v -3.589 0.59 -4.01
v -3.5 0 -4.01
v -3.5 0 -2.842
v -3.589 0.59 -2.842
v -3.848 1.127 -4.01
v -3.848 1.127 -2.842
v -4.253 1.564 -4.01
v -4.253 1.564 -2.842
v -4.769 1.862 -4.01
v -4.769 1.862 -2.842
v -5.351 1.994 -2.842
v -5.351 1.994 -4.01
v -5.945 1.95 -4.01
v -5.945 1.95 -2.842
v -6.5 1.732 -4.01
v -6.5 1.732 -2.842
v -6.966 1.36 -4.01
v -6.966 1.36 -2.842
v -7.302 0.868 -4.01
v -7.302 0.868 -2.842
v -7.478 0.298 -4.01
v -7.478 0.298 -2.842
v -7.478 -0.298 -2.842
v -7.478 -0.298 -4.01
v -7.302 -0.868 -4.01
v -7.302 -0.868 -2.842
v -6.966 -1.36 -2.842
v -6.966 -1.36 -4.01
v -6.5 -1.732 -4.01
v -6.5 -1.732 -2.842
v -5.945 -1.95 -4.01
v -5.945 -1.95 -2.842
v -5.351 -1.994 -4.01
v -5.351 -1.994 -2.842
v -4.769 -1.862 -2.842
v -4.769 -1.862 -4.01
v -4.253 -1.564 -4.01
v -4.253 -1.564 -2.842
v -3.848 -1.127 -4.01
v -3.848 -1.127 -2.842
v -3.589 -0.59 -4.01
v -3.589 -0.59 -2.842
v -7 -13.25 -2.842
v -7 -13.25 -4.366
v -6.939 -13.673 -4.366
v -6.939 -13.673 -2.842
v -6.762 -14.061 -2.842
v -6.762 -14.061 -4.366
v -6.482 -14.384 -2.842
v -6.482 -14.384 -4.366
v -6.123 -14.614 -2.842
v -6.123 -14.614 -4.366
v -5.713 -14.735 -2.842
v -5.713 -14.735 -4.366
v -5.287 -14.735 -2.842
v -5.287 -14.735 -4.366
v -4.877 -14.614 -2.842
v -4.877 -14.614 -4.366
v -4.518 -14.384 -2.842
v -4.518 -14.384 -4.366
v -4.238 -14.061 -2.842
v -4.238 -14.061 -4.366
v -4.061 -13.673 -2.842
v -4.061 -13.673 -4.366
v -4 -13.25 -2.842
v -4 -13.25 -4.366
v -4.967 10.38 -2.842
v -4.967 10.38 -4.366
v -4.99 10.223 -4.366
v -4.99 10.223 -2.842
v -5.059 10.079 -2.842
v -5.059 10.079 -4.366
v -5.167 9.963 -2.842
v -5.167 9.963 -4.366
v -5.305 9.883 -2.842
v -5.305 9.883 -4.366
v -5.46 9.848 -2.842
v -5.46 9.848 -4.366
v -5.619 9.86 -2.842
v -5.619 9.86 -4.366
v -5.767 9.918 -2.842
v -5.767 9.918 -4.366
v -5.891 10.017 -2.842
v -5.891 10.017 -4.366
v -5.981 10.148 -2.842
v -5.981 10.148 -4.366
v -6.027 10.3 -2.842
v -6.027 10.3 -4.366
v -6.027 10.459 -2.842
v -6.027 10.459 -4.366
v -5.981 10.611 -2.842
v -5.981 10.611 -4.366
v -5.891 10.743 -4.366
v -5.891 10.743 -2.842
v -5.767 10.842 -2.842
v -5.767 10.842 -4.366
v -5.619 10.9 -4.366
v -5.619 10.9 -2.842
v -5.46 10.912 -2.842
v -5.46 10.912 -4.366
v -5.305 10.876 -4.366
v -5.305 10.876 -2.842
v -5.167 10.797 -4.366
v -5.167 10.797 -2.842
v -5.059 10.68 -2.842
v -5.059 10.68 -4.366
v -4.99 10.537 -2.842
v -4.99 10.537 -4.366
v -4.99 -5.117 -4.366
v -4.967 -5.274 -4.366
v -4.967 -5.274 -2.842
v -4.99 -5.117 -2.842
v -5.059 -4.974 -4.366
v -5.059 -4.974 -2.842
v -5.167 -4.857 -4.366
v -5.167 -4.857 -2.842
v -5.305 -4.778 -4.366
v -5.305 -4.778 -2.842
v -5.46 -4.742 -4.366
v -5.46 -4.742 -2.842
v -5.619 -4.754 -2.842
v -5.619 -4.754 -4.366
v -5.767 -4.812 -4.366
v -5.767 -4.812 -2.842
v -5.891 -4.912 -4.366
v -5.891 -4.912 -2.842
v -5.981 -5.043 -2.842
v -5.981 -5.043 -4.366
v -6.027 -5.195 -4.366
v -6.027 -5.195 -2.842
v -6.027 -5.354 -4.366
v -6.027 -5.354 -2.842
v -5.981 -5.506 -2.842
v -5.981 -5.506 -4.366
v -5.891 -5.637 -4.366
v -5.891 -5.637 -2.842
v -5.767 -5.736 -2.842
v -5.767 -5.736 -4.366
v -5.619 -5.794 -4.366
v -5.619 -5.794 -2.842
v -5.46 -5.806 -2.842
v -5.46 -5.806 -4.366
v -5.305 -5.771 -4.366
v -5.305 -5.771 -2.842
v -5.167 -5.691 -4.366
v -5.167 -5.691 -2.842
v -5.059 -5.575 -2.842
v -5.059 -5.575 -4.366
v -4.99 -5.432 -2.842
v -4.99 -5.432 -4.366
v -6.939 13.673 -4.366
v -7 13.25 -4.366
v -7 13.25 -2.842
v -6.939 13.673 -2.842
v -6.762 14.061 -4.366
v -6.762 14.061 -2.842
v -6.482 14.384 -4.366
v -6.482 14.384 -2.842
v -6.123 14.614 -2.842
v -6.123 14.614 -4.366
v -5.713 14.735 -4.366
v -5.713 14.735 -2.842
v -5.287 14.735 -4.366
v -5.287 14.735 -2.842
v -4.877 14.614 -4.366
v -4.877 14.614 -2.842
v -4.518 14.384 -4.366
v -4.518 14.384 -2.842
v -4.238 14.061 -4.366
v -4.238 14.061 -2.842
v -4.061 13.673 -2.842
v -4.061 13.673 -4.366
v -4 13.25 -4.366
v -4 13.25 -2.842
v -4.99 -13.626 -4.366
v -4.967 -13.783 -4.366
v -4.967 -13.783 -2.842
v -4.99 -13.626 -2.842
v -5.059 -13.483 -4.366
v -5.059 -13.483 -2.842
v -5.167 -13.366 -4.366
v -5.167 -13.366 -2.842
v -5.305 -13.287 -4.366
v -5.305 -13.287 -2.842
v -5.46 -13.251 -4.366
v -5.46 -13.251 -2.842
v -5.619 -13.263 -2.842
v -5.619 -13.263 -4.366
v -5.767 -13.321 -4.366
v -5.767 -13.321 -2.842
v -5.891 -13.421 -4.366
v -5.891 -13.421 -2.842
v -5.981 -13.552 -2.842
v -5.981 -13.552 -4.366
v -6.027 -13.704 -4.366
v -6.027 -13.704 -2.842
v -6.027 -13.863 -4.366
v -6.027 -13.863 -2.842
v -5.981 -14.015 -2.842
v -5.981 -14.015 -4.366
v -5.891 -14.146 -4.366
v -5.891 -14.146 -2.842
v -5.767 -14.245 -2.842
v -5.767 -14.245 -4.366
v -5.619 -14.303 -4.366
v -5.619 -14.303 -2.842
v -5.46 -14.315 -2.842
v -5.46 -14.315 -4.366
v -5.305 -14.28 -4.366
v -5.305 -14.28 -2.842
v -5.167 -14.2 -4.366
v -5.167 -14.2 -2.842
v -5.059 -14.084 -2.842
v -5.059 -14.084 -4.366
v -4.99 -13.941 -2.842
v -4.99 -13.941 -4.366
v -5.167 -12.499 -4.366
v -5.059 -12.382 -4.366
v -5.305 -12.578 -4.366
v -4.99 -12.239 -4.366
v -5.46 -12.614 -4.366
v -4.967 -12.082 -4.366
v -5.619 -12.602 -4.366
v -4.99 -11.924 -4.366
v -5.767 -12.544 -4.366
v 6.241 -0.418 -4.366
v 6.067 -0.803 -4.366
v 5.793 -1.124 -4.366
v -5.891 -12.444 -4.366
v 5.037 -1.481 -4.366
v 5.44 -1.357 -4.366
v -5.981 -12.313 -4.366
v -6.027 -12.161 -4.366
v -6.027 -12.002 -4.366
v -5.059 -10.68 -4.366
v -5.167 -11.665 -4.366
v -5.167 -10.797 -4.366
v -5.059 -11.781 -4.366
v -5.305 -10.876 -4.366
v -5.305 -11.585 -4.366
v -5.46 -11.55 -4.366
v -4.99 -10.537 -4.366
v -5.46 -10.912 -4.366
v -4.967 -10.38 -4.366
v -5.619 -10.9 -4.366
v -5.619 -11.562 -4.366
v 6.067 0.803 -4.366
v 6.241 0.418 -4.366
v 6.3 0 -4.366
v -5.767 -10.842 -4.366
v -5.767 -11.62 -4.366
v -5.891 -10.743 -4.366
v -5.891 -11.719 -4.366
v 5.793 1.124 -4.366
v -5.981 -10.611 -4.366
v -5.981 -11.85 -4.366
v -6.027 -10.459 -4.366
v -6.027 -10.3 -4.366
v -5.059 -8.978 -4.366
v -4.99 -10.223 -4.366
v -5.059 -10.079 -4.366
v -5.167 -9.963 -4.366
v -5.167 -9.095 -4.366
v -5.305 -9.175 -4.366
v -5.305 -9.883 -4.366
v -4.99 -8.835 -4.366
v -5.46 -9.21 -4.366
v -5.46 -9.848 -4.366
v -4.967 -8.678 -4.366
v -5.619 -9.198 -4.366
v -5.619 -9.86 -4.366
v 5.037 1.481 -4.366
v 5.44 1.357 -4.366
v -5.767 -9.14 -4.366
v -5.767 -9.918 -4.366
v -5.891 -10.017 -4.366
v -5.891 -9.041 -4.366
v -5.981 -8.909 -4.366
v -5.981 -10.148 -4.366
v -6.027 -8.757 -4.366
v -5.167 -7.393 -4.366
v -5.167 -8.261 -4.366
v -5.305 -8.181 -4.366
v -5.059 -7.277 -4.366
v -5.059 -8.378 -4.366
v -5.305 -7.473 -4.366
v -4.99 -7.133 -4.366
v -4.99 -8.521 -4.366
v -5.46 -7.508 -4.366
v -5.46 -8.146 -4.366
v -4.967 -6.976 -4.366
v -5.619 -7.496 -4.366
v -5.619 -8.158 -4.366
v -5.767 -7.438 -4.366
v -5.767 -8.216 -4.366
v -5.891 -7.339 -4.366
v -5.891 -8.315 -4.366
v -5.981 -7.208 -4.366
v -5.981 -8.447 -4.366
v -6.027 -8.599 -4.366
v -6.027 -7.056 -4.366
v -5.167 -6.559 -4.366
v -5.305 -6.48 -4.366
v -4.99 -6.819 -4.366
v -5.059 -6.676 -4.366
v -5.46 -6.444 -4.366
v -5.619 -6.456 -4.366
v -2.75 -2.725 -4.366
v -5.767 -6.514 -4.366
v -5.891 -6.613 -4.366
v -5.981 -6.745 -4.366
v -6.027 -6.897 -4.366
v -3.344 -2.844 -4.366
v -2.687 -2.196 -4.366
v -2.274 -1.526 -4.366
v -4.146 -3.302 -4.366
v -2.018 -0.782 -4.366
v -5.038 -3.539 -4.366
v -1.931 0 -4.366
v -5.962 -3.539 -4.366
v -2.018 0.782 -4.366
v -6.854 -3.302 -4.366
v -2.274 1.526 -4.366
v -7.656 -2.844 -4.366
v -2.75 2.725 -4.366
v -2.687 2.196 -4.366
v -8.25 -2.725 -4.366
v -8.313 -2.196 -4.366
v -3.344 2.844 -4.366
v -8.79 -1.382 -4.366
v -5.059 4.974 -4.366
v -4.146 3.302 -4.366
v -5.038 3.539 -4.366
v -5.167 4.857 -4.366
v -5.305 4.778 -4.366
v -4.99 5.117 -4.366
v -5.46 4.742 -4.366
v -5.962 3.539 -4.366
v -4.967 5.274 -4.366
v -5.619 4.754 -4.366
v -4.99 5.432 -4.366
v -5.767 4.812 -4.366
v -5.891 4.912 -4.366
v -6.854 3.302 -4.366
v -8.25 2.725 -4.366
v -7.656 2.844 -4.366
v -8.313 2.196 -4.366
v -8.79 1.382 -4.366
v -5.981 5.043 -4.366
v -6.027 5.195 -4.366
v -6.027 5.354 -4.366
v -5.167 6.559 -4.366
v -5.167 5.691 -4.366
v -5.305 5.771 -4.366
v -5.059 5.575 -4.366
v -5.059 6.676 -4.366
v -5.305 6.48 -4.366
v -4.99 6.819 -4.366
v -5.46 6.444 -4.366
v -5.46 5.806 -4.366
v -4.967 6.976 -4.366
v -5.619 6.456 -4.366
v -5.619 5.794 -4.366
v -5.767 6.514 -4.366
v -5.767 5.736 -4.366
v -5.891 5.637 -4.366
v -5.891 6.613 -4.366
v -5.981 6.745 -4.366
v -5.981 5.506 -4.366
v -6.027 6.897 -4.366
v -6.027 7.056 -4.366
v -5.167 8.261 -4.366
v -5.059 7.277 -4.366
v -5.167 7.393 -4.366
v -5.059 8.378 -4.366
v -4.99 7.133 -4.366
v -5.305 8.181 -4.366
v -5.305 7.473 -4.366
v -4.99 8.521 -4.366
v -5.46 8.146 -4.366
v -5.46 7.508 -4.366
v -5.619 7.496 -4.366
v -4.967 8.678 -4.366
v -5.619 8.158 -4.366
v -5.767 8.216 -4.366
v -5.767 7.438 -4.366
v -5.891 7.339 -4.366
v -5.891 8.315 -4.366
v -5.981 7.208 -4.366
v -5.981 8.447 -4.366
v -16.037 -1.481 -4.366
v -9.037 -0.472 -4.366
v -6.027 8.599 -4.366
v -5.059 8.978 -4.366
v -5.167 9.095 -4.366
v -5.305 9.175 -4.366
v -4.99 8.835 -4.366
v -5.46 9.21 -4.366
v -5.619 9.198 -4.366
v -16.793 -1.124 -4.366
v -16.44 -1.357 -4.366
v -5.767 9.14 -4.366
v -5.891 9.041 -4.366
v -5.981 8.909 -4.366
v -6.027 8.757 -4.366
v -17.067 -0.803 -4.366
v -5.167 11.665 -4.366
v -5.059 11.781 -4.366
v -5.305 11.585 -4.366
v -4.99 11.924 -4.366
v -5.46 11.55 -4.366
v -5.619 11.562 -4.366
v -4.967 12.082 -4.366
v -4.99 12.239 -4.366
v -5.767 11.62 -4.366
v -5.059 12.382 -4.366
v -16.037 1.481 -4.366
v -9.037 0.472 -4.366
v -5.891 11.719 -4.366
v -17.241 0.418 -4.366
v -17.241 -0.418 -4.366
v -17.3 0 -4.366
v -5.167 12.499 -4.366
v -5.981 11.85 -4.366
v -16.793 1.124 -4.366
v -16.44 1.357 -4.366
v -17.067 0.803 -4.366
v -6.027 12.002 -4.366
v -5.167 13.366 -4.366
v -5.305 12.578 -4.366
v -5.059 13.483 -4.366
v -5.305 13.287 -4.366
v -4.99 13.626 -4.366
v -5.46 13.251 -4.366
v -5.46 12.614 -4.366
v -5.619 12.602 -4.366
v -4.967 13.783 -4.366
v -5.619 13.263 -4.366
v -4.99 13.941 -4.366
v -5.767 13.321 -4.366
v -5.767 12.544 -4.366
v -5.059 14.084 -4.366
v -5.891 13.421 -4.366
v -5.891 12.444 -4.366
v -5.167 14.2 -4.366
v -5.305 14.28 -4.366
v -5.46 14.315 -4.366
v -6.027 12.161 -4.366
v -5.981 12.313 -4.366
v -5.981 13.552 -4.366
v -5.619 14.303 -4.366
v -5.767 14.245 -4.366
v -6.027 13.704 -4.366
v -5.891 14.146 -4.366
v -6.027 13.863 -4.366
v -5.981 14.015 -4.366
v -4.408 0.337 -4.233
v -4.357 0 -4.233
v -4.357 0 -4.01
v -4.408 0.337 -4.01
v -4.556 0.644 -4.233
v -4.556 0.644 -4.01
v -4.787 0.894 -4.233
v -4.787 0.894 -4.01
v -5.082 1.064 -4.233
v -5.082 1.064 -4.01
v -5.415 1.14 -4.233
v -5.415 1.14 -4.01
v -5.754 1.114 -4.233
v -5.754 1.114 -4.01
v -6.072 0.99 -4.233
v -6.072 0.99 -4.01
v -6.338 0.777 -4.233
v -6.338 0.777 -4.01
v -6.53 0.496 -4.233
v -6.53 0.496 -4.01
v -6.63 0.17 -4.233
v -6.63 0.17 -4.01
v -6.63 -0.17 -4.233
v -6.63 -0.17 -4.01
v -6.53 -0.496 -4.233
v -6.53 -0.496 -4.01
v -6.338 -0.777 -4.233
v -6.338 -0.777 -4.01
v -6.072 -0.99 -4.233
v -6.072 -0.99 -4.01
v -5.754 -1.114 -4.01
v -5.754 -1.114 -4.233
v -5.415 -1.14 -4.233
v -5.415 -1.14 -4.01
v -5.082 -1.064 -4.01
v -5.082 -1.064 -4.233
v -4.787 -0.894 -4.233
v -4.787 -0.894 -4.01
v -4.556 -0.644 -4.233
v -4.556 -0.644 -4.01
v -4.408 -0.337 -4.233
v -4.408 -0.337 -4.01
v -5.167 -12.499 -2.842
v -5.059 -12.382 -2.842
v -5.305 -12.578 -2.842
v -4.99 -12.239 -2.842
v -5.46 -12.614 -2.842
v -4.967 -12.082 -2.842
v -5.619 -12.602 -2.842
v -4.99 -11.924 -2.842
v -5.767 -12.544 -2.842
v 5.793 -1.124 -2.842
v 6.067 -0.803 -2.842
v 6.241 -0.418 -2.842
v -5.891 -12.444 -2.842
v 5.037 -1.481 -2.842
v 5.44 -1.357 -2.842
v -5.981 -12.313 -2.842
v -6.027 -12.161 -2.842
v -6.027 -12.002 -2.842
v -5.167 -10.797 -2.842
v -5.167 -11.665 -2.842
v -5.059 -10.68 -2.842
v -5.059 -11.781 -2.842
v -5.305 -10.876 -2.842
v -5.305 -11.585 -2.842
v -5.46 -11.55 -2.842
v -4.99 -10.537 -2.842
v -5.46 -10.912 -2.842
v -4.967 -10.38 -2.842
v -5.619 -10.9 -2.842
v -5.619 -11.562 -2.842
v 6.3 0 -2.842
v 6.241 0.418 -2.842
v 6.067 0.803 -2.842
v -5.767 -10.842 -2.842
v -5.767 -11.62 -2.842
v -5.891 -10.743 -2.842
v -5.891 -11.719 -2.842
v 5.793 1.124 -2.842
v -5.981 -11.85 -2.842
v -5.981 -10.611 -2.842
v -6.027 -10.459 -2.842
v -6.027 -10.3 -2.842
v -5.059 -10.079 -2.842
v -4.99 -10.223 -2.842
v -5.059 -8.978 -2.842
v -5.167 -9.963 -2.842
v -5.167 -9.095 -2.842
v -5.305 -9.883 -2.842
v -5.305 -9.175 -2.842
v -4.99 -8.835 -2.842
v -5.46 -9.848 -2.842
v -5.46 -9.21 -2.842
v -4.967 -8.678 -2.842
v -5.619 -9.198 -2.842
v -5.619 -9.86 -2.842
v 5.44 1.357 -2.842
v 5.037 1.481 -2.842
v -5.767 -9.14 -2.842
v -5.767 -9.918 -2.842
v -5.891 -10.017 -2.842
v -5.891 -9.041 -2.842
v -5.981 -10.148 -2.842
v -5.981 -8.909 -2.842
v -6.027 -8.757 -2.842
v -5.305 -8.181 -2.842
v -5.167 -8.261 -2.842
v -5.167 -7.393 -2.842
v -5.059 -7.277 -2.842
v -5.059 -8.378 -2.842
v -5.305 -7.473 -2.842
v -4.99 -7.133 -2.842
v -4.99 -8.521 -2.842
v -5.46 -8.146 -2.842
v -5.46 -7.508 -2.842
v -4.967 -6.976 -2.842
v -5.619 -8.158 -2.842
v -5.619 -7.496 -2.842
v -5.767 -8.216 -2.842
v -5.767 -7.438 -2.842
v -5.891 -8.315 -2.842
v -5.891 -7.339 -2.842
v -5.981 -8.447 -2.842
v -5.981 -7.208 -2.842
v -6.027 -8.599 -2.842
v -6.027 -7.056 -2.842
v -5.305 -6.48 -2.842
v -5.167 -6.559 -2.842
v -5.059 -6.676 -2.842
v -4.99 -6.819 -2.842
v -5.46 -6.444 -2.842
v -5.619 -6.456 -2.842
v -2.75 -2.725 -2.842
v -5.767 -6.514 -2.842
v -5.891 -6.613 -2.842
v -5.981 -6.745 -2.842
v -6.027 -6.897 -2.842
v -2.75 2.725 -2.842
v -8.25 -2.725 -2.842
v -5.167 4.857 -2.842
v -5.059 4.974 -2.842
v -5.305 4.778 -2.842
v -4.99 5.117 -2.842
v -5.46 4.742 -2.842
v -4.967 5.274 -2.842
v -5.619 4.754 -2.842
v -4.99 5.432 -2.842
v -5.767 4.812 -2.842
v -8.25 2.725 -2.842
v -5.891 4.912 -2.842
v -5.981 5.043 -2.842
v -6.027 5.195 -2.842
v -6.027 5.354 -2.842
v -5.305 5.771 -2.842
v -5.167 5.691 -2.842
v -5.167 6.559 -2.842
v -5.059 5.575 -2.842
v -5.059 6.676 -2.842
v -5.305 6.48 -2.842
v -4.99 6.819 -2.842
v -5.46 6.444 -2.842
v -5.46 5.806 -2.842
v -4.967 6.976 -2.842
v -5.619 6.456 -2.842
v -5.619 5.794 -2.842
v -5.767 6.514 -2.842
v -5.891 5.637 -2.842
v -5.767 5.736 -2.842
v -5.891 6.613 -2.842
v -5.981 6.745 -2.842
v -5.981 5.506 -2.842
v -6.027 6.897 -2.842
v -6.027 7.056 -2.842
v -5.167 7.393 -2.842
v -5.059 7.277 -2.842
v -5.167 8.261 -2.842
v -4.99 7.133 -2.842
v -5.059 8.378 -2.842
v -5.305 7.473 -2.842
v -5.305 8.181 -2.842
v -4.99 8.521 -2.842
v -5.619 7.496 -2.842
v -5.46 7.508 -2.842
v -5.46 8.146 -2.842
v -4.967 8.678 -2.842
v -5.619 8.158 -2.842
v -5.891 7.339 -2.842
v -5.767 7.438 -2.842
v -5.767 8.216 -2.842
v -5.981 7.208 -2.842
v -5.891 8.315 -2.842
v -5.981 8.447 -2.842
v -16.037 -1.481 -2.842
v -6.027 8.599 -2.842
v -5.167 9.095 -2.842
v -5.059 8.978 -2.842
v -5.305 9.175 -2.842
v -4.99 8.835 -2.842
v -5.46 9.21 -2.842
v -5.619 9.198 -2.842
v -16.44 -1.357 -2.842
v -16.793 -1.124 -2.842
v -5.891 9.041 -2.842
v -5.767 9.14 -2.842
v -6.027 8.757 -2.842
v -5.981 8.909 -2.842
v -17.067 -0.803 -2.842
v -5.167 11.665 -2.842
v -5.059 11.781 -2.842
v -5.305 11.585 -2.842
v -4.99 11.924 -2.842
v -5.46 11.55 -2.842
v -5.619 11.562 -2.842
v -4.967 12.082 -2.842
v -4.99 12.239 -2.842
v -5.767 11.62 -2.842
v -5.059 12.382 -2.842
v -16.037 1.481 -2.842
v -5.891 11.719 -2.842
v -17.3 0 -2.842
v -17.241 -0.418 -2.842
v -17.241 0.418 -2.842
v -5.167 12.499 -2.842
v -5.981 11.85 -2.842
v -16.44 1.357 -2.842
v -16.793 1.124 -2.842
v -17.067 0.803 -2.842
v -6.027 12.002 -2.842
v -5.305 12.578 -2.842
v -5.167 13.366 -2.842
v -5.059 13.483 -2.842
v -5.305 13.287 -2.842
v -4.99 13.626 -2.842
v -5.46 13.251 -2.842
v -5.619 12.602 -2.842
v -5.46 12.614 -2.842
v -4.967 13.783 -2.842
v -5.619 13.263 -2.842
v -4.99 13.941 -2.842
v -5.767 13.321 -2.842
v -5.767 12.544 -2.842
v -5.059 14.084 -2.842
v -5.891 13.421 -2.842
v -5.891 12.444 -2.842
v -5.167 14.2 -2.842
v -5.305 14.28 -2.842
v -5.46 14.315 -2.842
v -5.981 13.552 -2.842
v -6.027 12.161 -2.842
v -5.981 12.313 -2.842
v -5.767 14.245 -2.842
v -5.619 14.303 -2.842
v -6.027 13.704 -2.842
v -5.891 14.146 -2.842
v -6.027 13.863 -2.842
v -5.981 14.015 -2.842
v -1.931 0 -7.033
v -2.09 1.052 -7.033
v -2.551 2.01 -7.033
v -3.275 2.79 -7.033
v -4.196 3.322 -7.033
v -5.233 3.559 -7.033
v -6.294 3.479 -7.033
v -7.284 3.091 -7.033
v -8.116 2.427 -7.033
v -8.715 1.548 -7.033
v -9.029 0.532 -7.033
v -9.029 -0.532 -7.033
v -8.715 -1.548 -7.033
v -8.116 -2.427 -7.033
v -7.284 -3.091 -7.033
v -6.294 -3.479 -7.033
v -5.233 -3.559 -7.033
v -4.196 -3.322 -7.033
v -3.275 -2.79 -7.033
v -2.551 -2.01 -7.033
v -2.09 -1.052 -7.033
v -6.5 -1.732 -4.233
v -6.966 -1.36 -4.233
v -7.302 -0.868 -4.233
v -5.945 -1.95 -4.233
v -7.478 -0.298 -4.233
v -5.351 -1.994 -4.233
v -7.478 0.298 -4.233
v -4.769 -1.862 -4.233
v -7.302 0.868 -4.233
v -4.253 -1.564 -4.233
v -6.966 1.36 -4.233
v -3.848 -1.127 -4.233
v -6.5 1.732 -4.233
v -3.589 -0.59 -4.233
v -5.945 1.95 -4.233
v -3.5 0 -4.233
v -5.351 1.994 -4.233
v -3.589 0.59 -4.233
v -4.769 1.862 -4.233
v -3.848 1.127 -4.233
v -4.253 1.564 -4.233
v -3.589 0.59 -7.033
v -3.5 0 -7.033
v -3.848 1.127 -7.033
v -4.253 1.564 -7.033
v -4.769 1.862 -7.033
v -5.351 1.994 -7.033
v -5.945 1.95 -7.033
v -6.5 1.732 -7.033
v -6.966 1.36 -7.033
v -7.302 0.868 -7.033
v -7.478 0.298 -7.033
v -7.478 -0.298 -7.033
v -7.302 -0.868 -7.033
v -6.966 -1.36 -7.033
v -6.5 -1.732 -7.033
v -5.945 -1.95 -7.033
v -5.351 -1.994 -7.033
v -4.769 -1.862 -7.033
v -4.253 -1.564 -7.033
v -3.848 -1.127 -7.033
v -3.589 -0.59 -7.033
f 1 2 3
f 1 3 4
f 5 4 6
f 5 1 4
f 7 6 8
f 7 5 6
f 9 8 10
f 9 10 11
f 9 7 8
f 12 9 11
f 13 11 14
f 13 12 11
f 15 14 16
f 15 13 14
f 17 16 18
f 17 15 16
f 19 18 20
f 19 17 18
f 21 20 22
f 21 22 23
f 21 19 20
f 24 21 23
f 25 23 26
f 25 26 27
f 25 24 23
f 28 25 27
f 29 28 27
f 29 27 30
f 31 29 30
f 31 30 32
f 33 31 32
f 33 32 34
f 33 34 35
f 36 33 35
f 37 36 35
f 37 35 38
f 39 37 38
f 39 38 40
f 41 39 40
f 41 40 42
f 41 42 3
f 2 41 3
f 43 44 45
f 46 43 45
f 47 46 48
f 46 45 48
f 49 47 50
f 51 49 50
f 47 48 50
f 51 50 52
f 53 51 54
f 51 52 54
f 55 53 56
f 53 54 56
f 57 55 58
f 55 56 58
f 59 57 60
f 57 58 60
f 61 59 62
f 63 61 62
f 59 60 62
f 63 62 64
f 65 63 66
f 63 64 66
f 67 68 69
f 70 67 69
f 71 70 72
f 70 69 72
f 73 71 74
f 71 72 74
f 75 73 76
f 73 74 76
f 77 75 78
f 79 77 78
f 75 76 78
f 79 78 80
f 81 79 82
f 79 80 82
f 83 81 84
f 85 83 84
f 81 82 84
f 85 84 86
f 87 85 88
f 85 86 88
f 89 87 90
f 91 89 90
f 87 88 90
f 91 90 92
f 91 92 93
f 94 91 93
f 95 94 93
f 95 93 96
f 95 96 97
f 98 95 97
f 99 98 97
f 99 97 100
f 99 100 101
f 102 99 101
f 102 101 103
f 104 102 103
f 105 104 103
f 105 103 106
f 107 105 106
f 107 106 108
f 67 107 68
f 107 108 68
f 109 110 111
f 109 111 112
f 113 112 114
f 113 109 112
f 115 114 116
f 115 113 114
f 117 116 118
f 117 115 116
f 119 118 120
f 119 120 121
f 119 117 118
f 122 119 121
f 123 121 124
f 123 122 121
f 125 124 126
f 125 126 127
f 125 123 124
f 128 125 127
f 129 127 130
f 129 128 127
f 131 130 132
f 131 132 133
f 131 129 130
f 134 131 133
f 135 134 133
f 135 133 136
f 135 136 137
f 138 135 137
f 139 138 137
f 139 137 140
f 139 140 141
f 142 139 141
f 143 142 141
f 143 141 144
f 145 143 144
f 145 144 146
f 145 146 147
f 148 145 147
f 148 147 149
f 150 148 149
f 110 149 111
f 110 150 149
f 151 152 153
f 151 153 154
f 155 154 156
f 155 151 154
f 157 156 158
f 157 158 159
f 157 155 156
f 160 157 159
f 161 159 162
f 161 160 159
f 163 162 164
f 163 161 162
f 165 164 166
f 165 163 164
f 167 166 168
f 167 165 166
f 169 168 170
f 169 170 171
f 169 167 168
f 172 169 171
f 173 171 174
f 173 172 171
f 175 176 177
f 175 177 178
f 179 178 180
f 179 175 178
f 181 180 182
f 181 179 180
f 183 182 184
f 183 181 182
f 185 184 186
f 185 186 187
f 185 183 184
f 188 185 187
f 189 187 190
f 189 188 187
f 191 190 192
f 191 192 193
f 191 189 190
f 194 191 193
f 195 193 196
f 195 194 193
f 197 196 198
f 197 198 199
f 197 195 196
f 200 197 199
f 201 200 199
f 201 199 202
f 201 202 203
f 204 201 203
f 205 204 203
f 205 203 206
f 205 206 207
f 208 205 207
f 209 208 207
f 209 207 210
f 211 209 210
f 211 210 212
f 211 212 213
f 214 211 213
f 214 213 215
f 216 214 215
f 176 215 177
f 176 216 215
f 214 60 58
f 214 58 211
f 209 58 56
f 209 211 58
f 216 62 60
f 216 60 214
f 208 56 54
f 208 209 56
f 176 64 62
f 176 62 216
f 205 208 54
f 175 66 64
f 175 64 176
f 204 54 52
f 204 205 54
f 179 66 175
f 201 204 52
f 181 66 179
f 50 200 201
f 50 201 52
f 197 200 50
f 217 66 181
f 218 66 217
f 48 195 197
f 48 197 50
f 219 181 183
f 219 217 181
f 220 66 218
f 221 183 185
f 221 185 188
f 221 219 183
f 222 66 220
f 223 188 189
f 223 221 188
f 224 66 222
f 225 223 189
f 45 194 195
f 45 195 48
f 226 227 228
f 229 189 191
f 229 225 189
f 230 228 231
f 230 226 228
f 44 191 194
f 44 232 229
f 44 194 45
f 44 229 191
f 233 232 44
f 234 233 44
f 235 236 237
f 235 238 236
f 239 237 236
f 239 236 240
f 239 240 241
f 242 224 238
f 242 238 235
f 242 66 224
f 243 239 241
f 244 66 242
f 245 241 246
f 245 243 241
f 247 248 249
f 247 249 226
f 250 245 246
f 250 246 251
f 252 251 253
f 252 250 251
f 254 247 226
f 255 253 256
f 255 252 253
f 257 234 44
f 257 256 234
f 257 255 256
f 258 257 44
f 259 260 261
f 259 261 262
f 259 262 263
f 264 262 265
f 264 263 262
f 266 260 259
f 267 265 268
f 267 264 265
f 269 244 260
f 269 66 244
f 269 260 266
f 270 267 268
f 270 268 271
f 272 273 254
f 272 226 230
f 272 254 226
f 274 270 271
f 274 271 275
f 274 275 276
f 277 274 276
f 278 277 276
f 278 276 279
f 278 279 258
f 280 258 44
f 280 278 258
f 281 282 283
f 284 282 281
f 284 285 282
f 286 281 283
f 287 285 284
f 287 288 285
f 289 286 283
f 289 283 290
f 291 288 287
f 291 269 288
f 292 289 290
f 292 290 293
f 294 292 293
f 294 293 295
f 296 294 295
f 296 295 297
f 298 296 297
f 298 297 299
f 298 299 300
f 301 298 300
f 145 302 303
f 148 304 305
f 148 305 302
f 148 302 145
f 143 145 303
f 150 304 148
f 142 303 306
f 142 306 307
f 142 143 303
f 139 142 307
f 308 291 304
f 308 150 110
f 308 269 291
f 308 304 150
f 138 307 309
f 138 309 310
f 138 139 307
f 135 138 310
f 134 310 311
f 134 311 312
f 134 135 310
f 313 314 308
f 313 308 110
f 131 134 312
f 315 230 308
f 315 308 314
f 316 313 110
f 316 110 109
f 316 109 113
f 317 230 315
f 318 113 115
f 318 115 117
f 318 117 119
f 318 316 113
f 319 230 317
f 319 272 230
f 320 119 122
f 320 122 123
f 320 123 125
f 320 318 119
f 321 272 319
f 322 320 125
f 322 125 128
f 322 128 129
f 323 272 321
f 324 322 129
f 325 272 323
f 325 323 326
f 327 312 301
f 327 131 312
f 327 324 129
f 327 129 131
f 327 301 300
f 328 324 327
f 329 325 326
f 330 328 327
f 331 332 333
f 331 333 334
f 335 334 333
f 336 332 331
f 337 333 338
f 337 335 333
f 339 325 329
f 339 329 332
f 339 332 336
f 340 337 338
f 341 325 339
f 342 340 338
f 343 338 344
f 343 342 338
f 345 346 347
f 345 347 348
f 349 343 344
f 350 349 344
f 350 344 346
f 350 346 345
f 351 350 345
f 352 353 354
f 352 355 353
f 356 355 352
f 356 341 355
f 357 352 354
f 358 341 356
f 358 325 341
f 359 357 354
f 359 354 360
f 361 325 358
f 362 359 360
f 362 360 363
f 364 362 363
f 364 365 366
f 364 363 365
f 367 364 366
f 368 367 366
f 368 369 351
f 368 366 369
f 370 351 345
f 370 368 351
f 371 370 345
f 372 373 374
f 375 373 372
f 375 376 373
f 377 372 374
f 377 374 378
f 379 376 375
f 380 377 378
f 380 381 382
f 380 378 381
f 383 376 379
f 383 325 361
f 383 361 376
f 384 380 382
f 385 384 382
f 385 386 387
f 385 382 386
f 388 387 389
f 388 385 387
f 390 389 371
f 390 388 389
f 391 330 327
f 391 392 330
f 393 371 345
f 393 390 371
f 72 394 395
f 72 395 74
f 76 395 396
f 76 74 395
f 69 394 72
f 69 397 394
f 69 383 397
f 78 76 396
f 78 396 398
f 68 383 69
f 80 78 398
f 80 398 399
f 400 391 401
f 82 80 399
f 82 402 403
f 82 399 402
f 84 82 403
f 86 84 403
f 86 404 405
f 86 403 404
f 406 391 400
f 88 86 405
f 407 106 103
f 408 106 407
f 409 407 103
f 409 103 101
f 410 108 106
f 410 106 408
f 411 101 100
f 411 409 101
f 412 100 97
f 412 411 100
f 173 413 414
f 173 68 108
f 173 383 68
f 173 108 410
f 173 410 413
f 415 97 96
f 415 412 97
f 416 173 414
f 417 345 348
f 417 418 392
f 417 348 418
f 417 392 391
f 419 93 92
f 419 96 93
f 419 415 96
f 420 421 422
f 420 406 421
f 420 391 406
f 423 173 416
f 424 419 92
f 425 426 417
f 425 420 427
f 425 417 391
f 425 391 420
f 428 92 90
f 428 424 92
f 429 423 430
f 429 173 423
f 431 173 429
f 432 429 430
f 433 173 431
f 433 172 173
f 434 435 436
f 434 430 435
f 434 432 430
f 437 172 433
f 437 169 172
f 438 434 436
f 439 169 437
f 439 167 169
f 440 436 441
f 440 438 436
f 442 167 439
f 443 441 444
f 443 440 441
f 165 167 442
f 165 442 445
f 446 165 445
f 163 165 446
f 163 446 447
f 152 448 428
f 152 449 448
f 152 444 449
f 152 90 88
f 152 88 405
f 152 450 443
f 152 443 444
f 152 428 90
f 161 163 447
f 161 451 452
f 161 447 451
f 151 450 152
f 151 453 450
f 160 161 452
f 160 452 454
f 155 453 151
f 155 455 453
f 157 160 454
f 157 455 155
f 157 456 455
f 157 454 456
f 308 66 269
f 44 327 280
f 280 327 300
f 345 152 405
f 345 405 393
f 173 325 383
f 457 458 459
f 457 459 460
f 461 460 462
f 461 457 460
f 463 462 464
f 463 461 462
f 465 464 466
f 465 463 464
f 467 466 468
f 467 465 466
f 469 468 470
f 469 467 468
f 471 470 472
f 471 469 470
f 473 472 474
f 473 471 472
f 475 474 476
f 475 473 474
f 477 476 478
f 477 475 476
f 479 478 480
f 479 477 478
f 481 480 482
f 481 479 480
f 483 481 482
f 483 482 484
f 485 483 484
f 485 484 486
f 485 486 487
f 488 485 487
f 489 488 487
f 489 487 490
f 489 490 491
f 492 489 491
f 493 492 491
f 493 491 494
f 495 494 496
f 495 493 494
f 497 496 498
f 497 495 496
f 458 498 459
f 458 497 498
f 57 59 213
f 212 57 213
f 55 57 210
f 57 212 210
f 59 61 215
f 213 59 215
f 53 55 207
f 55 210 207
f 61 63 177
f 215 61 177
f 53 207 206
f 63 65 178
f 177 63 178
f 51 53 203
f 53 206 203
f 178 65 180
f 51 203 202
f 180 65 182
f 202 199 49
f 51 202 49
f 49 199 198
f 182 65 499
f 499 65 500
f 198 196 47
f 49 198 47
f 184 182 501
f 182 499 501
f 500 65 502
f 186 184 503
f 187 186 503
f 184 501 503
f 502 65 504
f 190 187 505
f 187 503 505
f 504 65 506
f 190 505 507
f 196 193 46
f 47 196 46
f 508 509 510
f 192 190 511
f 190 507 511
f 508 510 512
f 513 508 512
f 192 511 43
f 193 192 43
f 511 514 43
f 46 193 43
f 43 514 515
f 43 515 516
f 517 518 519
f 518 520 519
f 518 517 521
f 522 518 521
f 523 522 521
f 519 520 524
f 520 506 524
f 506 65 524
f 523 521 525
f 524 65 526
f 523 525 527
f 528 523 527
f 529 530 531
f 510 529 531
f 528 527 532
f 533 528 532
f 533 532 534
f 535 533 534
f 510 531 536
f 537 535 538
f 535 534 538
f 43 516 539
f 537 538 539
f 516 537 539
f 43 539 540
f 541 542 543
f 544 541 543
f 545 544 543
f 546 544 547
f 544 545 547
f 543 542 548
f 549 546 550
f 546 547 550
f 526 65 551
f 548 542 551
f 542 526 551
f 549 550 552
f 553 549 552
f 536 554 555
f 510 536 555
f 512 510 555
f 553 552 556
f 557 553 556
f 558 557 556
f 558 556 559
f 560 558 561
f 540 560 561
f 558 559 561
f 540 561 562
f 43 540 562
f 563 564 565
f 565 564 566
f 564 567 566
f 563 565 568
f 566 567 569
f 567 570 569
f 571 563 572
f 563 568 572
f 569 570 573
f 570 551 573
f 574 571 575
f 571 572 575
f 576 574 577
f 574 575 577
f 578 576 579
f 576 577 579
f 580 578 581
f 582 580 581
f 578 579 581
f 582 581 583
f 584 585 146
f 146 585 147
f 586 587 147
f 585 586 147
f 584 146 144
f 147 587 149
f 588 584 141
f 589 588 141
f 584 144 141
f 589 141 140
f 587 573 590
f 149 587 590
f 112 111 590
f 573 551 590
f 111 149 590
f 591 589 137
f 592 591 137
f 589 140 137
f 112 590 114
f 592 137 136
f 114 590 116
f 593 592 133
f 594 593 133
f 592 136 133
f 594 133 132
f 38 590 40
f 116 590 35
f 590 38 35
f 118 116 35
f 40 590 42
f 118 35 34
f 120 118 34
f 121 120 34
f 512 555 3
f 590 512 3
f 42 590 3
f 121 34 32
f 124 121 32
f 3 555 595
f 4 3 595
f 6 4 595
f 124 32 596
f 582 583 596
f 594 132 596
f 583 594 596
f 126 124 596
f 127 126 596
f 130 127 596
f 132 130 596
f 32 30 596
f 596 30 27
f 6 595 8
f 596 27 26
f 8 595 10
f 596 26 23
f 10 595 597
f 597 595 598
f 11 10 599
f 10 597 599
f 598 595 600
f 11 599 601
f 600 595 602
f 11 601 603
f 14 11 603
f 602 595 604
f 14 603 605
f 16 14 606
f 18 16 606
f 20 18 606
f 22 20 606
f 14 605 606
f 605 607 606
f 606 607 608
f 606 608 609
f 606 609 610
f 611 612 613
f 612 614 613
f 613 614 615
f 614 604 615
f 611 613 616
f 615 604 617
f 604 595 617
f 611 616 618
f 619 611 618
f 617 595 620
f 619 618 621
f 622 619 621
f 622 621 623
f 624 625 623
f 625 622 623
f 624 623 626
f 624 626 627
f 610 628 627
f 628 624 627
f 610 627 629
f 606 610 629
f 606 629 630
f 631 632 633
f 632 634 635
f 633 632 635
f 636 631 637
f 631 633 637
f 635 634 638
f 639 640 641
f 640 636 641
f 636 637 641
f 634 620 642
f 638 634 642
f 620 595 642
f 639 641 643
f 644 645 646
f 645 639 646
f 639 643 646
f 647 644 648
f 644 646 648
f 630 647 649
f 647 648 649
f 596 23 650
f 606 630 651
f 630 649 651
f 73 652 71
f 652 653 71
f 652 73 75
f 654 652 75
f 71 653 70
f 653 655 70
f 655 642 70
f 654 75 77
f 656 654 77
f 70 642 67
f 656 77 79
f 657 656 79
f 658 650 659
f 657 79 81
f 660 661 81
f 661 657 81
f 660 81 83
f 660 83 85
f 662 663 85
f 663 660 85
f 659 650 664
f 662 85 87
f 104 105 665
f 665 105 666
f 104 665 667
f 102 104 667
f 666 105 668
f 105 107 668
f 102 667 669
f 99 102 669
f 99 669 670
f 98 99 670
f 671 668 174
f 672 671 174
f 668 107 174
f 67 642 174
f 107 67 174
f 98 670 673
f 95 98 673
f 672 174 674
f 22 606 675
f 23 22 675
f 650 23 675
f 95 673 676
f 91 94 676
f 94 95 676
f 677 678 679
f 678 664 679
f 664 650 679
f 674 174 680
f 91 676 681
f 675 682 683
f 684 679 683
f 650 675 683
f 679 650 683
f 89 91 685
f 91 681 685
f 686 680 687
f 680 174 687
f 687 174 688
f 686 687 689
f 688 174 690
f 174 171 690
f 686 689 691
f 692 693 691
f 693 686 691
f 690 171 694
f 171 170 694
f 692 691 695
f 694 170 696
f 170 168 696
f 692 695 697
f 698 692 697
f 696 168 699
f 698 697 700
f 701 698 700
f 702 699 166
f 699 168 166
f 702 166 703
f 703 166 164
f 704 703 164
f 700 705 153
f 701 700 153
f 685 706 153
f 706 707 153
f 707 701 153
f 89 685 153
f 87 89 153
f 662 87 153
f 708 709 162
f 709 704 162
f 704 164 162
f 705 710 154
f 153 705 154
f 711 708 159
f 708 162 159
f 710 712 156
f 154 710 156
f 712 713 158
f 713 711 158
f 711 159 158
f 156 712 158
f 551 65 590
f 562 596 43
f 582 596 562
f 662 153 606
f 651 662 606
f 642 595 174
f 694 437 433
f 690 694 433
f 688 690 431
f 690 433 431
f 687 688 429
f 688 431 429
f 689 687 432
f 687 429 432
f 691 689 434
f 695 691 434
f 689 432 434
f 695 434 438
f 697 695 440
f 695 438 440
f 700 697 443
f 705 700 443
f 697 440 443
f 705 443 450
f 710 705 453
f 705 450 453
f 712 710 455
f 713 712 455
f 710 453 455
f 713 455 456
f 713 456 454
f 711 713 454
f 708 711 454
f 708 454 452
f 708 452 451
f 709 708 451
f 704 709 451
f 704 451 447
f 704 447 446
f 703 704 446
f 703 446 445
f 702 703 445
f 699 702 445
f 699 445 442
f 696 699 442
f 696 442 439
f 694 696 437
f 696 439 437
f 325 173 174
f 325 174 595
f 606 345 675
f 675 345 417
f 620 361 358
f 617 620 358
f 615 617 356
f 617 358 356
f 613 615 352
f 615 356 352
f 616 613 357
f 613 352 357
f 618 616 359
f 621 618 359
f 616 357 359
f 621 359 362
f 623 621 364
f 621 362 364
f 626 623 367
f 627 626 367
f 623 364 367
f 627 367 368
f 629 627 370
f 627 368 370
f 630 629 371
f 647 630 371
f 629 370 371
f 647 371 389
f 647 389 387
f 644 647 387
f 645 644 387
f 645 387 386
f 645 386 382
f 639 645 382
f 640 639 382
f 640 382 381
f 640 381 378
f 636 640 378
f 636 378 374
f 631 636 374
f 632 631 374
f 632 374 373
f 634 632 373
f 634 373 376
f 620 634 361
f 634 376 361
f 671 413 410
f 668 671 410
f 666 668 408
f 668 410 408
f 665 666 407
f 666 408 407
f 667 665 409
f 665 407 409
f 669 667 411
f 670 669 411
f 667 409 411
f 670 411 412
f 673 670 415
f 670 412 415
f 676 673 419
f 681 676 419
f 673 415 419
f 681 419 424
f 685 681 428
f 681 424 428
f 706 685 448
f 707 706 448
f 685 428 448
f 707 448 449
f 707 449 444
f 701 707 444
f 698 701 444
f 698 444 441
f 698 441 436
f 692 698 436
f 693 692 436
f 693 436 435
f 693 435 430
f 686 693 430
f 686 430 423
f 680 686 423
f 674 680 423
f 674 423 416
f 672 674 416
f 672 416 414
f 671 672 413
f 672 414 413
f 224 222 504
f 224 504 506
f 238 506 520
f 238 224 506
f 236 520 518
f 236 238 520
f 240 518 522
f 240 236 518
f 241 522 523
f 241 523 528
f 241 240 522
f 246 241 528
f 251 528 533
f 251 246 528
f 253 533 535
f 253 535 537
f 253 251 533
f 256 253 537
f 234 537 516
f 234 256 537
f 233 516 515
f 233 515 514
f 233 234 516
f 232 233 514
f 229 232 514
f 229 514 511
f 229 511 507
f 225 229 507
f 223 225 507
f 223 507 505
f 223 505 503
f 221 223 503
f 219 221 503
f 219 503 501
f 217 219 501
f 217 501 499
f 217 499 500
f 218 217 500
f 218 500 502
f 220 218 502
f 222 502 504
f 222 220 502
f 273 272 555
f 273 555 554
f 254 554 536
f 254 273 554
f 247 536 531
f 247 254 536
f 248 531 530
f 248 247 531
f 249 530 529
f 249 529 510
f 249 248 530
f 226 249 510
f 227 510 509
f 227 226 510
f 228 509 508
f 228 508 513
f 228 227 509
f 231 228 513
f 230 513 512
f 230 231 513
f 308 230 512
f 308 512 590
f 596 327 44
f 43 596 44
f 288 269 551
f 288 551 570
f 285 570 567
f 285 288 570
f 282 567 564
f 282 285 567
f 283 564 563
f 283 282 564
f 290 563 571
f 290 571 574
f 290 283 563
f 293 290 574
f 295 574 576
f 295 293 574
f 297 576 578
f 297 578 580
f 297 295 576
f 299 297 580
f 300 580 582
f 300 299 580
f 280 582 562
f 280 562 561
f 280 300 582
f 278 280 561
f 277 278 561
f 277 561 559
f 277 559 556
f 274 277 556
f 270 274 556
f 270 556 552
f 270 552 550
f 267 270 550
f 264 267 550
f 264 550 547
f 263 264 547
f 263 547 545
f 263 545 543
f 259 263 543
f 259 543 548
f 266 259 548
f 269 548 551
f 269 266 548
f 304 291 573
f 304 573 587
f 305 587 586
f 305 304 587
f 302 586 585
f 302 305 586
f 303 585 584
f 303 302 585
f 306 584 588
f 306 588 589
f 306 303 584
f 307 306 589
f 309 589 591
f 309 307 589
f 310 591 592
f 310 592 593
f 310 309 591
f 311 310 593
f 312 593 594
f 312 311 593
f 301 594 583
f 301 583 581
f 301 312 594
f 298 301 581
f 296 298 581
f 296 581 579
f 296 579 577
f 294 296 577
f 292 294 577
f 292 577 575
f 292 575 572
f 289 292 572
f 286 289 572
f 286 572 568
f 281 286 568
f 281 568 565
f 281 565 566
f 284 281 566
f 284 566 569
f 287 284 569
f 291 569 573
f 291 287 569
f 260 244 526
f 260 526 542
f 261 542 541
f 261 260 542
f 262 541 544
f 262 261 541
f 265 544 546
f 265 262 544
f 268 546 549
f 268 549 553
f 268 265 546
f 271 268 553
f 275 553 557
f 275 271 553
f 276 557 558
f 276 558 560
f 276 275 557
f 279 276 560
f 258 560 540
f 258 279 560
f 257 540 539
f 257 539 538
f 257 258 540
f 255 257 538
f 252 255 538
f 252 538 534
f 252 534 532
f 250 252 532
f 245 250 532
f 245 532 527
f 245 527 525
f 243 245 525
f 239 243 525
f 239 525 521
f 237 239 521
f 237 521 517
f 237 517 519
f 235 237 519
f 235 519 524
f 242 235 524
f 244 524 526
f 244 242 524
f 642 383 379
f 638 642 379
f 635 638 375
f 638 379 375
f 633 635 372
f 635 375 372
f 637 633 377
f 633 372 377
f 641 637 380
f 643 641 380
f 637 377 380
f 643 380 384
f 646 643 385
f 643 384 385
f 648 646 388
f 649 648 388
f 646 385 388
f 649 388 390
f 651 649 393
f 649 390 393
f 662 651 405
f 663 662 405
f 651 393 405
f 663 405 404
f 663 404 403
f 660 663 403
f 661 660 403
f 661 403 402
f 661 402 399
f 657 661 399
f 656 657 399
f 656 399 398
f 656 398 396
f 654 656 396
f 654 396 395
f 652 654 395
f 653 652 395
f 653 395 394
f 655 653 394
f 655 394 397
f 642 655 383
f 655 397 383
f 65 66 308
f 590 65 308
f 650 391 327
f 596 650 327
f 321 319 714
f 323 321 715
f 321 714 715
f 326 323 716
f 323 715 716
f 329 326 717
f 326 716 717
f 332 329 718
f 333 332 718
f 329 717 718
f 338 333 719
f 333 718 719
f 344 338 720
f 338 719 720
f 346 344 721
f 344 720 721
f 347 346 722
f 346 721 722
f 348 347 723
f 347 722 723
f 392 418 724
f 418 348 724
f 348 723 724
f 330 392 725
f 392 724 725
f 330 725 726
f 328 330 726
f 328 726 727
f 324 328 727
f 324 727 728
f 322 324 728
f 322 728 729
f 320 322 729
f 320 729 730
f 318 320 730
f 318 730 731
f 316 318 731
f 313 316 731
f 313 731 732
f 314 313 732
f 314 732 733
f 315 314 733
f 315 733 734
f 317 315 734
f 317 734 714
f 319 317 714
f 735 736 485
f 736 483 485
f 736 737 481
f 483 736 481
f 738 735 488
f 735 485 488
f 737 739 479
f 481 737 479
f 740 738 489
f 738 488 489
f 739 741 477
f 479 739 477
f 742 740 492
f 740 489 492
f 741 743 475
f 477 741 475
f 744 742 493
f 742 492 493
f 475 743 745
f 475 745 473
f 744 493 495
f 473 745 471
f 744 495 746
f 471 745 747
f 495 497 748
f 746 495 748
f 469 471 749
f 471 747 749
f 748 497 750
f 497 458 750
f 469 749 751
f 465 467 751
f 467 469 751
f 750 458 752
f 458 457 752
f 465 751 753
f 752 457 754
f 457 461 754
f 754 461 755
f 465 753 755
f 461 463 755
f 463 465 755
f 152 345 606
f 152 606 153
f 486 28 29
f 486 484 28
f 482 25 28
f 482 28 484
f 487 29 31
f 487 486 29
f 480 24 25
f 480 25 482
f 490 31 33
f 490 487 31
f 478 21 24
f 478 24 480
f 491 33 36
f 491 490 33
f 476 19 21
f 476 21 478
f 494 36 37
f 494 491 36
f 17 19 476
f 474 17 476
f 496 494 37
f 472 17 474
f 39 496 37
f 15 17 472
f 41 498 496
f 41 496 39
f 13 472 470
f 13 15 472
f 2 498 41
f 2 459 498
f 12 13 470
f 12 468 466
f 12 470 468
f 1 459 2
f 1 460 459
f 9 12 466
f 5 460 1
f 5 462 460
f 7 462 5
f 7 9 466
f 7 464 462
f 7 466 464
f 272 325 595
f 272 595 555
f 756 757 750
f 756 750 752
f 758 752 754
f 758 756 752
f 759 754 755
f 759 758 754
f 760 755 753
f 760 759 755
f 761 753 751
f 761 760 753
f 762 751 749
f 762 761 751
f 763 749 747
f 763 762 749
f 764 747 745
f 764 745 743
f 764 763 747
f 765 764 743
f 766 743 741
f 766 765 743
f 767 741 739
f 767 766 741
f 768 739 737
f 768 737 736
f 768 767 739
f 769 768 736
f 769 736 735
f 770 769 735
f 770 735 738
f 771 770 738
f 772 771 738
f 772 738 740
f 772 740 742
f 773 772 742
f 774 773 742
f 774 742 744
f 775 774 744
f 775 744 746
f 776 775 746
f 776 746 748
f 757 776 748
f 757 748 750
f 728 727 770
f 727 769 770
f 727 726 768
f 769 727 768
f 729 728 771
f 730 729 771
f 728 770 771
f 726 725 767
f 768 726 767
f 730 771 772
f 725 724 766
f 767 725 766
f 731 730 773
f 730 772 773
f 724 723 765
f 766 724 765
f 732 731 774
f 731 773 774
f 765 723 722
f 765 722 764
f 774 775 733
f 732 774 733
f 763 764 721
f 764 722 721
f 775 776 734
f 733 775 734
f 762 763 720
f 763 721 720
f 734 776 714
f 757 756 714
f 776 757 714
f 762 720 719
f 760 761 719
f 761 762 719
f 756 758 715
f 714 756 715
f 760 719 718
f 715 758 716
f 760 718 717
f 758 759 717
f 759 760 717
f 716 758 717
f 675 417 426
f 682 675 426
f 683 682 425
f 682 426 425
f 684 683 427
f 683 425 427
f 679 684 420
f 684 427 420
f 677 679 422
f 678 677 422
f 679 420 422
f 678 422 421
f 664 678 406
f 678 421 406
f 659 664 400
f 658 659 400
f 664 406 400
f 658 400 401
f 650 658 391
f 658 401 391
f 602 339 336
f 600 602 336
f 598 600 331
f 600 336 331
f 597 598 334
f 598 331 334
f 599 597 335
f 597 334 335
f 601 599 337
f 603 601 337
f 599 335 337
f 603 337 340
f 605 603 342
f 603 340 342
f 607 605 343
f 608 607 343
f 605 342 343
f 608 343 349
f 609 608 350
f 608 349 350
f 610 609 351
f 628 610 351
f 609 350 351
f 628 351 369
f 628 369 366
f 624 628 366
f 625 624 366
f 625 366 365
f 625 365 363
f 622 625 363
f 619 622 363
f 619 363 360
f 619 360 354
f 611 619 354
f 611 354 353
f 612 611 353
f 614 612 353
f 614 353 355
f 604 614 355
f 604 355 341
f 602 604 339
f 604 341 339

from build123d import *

# Parameters (mm, degrees)
SKETCH1_R           = 3.5687
SKETCH1_R_2         = 2
BOSS_EXTRUDE1_DEPTH = 4.191
SKETCH5_R           = 2
SKETCH5_R_2         = 1.143
BOSS_EXTRUDE2_DEPTH = 0.2226
BOSS_EXTRUDE3_START = -1.524
SKETCH6_R           = 0.5334
BOSS_EXTRUDE3_DEPTH = 1.524
BOSS_EXTRUDE4_START = -1.524
BOSS_EXTRUDE4_DEPTH = 1.524


with BuildPart() as part:
    # Sketch1 → Boss-Extrude1 (new body)
    with BuildSketch(Plane.XY.offset(-7.032965862)):
        with Locations((-5.5, 0)):
            Circle(SKETCH1_R)
        with Locations((-5.5, 0)):
            Circle(SKETCH1_R_2, mode=Mode.SUBTRACT)
    extrude(amount=BOSS_EXTRUDE1_DEPTH)

    # Sketch5 → Boss-Extrude2 (add)
    with BuildSketch(Plane.XY.offset(-4.232965862)):
        with Locations((-5.5, 0)):
            Circle(SKETCH5_R)
        with Locations((-5.5, 0)):
            Circle(SKETCH5_R_2, mode=Mode.SUBTRACT)
    extrude(amount=BOSS_EXTRUDE2_DEPTH)

    # Sketch6 → Boss-Extrude3 (add)
    with BuildSketch(Plane.XY.offset(-2.841965862).offset(BOSS_EXTRUDE3_START)):
        with BuildLine():
            Line((-4, -13.25), (-2.68695, -2.195989387))
            ThreePointArc((-2.68695, -2.195989387), (-5.5, -3.5687), (-8.31305, -2.195989387))
            Line((-8.31305, -2.195989387), (-7, -13.25))
            ThreePointArc((-7, -13.25), (-5.5, -14.75), (-4, -13.25))
        make_face()
        with Locations((-5.5, -12.0816)):
            Circle(SKETCH6_R, mode=Mode.SUBTRACT)
        with Locations((-5.5, -13.7834)):
            Circle(SKETCH6_R, mode=Mode.SUBTRACT)
        with Locations((-5.5, -10.3798)):
            Circle(SKETCH6_R, mode=Mode.SUBTRACT)
        with Locations((-5.5, -8.678)):
            Circle(SKETCH6_R, mode=Mode.SUBTRACT)
        with Locations((-5.5, -6.9762)):
            Circle(SKETCH6_R, mode=Mode.SUBTRACT)
        with Locations((-5.5, -5.2744)):
            Circle(SKETCH6_R, mode=Mode.SUBTRACT)
    boss_extrude3 = extrude(amount=BOSS_EXTRUDE3_DEPTH)

    # Mirror1: Boss-Extrude3 across plane
    add(boss_extrude3.mirror(Plane.ZX))

    # Sketch7 → Boss-Extrude4 (add)
    with BuildSketch(Plane.XY.offset(-2.841965862).offset(BOSS_EXTRUDE4_START)):
        with BuildLine():
            Line((-16.036523348, -1.481234859), (-7.695989387, -2.81305))
            ThreePointArc((-7.695989387, -2.81305), (-9.0687, 0), (-7.695989387, 2.81305))
            Line((-7.695989387, 2.81305), (-16.036523348, 1.481234859))
            ThreePointArc((-16.036523348, 1.481234859), (-17.3, 0), (-16.036523348, -1.481234859))
        make_face()
    boss_extrude4 = extrude(amount=BOSS_EXTRUDE4_DEPTH)

    # Mirror2: Boss-Extrude4 across plane
    add(boss_extrude4.mirror(Plane.ZY.offset(5.5)))


solid = part.part
